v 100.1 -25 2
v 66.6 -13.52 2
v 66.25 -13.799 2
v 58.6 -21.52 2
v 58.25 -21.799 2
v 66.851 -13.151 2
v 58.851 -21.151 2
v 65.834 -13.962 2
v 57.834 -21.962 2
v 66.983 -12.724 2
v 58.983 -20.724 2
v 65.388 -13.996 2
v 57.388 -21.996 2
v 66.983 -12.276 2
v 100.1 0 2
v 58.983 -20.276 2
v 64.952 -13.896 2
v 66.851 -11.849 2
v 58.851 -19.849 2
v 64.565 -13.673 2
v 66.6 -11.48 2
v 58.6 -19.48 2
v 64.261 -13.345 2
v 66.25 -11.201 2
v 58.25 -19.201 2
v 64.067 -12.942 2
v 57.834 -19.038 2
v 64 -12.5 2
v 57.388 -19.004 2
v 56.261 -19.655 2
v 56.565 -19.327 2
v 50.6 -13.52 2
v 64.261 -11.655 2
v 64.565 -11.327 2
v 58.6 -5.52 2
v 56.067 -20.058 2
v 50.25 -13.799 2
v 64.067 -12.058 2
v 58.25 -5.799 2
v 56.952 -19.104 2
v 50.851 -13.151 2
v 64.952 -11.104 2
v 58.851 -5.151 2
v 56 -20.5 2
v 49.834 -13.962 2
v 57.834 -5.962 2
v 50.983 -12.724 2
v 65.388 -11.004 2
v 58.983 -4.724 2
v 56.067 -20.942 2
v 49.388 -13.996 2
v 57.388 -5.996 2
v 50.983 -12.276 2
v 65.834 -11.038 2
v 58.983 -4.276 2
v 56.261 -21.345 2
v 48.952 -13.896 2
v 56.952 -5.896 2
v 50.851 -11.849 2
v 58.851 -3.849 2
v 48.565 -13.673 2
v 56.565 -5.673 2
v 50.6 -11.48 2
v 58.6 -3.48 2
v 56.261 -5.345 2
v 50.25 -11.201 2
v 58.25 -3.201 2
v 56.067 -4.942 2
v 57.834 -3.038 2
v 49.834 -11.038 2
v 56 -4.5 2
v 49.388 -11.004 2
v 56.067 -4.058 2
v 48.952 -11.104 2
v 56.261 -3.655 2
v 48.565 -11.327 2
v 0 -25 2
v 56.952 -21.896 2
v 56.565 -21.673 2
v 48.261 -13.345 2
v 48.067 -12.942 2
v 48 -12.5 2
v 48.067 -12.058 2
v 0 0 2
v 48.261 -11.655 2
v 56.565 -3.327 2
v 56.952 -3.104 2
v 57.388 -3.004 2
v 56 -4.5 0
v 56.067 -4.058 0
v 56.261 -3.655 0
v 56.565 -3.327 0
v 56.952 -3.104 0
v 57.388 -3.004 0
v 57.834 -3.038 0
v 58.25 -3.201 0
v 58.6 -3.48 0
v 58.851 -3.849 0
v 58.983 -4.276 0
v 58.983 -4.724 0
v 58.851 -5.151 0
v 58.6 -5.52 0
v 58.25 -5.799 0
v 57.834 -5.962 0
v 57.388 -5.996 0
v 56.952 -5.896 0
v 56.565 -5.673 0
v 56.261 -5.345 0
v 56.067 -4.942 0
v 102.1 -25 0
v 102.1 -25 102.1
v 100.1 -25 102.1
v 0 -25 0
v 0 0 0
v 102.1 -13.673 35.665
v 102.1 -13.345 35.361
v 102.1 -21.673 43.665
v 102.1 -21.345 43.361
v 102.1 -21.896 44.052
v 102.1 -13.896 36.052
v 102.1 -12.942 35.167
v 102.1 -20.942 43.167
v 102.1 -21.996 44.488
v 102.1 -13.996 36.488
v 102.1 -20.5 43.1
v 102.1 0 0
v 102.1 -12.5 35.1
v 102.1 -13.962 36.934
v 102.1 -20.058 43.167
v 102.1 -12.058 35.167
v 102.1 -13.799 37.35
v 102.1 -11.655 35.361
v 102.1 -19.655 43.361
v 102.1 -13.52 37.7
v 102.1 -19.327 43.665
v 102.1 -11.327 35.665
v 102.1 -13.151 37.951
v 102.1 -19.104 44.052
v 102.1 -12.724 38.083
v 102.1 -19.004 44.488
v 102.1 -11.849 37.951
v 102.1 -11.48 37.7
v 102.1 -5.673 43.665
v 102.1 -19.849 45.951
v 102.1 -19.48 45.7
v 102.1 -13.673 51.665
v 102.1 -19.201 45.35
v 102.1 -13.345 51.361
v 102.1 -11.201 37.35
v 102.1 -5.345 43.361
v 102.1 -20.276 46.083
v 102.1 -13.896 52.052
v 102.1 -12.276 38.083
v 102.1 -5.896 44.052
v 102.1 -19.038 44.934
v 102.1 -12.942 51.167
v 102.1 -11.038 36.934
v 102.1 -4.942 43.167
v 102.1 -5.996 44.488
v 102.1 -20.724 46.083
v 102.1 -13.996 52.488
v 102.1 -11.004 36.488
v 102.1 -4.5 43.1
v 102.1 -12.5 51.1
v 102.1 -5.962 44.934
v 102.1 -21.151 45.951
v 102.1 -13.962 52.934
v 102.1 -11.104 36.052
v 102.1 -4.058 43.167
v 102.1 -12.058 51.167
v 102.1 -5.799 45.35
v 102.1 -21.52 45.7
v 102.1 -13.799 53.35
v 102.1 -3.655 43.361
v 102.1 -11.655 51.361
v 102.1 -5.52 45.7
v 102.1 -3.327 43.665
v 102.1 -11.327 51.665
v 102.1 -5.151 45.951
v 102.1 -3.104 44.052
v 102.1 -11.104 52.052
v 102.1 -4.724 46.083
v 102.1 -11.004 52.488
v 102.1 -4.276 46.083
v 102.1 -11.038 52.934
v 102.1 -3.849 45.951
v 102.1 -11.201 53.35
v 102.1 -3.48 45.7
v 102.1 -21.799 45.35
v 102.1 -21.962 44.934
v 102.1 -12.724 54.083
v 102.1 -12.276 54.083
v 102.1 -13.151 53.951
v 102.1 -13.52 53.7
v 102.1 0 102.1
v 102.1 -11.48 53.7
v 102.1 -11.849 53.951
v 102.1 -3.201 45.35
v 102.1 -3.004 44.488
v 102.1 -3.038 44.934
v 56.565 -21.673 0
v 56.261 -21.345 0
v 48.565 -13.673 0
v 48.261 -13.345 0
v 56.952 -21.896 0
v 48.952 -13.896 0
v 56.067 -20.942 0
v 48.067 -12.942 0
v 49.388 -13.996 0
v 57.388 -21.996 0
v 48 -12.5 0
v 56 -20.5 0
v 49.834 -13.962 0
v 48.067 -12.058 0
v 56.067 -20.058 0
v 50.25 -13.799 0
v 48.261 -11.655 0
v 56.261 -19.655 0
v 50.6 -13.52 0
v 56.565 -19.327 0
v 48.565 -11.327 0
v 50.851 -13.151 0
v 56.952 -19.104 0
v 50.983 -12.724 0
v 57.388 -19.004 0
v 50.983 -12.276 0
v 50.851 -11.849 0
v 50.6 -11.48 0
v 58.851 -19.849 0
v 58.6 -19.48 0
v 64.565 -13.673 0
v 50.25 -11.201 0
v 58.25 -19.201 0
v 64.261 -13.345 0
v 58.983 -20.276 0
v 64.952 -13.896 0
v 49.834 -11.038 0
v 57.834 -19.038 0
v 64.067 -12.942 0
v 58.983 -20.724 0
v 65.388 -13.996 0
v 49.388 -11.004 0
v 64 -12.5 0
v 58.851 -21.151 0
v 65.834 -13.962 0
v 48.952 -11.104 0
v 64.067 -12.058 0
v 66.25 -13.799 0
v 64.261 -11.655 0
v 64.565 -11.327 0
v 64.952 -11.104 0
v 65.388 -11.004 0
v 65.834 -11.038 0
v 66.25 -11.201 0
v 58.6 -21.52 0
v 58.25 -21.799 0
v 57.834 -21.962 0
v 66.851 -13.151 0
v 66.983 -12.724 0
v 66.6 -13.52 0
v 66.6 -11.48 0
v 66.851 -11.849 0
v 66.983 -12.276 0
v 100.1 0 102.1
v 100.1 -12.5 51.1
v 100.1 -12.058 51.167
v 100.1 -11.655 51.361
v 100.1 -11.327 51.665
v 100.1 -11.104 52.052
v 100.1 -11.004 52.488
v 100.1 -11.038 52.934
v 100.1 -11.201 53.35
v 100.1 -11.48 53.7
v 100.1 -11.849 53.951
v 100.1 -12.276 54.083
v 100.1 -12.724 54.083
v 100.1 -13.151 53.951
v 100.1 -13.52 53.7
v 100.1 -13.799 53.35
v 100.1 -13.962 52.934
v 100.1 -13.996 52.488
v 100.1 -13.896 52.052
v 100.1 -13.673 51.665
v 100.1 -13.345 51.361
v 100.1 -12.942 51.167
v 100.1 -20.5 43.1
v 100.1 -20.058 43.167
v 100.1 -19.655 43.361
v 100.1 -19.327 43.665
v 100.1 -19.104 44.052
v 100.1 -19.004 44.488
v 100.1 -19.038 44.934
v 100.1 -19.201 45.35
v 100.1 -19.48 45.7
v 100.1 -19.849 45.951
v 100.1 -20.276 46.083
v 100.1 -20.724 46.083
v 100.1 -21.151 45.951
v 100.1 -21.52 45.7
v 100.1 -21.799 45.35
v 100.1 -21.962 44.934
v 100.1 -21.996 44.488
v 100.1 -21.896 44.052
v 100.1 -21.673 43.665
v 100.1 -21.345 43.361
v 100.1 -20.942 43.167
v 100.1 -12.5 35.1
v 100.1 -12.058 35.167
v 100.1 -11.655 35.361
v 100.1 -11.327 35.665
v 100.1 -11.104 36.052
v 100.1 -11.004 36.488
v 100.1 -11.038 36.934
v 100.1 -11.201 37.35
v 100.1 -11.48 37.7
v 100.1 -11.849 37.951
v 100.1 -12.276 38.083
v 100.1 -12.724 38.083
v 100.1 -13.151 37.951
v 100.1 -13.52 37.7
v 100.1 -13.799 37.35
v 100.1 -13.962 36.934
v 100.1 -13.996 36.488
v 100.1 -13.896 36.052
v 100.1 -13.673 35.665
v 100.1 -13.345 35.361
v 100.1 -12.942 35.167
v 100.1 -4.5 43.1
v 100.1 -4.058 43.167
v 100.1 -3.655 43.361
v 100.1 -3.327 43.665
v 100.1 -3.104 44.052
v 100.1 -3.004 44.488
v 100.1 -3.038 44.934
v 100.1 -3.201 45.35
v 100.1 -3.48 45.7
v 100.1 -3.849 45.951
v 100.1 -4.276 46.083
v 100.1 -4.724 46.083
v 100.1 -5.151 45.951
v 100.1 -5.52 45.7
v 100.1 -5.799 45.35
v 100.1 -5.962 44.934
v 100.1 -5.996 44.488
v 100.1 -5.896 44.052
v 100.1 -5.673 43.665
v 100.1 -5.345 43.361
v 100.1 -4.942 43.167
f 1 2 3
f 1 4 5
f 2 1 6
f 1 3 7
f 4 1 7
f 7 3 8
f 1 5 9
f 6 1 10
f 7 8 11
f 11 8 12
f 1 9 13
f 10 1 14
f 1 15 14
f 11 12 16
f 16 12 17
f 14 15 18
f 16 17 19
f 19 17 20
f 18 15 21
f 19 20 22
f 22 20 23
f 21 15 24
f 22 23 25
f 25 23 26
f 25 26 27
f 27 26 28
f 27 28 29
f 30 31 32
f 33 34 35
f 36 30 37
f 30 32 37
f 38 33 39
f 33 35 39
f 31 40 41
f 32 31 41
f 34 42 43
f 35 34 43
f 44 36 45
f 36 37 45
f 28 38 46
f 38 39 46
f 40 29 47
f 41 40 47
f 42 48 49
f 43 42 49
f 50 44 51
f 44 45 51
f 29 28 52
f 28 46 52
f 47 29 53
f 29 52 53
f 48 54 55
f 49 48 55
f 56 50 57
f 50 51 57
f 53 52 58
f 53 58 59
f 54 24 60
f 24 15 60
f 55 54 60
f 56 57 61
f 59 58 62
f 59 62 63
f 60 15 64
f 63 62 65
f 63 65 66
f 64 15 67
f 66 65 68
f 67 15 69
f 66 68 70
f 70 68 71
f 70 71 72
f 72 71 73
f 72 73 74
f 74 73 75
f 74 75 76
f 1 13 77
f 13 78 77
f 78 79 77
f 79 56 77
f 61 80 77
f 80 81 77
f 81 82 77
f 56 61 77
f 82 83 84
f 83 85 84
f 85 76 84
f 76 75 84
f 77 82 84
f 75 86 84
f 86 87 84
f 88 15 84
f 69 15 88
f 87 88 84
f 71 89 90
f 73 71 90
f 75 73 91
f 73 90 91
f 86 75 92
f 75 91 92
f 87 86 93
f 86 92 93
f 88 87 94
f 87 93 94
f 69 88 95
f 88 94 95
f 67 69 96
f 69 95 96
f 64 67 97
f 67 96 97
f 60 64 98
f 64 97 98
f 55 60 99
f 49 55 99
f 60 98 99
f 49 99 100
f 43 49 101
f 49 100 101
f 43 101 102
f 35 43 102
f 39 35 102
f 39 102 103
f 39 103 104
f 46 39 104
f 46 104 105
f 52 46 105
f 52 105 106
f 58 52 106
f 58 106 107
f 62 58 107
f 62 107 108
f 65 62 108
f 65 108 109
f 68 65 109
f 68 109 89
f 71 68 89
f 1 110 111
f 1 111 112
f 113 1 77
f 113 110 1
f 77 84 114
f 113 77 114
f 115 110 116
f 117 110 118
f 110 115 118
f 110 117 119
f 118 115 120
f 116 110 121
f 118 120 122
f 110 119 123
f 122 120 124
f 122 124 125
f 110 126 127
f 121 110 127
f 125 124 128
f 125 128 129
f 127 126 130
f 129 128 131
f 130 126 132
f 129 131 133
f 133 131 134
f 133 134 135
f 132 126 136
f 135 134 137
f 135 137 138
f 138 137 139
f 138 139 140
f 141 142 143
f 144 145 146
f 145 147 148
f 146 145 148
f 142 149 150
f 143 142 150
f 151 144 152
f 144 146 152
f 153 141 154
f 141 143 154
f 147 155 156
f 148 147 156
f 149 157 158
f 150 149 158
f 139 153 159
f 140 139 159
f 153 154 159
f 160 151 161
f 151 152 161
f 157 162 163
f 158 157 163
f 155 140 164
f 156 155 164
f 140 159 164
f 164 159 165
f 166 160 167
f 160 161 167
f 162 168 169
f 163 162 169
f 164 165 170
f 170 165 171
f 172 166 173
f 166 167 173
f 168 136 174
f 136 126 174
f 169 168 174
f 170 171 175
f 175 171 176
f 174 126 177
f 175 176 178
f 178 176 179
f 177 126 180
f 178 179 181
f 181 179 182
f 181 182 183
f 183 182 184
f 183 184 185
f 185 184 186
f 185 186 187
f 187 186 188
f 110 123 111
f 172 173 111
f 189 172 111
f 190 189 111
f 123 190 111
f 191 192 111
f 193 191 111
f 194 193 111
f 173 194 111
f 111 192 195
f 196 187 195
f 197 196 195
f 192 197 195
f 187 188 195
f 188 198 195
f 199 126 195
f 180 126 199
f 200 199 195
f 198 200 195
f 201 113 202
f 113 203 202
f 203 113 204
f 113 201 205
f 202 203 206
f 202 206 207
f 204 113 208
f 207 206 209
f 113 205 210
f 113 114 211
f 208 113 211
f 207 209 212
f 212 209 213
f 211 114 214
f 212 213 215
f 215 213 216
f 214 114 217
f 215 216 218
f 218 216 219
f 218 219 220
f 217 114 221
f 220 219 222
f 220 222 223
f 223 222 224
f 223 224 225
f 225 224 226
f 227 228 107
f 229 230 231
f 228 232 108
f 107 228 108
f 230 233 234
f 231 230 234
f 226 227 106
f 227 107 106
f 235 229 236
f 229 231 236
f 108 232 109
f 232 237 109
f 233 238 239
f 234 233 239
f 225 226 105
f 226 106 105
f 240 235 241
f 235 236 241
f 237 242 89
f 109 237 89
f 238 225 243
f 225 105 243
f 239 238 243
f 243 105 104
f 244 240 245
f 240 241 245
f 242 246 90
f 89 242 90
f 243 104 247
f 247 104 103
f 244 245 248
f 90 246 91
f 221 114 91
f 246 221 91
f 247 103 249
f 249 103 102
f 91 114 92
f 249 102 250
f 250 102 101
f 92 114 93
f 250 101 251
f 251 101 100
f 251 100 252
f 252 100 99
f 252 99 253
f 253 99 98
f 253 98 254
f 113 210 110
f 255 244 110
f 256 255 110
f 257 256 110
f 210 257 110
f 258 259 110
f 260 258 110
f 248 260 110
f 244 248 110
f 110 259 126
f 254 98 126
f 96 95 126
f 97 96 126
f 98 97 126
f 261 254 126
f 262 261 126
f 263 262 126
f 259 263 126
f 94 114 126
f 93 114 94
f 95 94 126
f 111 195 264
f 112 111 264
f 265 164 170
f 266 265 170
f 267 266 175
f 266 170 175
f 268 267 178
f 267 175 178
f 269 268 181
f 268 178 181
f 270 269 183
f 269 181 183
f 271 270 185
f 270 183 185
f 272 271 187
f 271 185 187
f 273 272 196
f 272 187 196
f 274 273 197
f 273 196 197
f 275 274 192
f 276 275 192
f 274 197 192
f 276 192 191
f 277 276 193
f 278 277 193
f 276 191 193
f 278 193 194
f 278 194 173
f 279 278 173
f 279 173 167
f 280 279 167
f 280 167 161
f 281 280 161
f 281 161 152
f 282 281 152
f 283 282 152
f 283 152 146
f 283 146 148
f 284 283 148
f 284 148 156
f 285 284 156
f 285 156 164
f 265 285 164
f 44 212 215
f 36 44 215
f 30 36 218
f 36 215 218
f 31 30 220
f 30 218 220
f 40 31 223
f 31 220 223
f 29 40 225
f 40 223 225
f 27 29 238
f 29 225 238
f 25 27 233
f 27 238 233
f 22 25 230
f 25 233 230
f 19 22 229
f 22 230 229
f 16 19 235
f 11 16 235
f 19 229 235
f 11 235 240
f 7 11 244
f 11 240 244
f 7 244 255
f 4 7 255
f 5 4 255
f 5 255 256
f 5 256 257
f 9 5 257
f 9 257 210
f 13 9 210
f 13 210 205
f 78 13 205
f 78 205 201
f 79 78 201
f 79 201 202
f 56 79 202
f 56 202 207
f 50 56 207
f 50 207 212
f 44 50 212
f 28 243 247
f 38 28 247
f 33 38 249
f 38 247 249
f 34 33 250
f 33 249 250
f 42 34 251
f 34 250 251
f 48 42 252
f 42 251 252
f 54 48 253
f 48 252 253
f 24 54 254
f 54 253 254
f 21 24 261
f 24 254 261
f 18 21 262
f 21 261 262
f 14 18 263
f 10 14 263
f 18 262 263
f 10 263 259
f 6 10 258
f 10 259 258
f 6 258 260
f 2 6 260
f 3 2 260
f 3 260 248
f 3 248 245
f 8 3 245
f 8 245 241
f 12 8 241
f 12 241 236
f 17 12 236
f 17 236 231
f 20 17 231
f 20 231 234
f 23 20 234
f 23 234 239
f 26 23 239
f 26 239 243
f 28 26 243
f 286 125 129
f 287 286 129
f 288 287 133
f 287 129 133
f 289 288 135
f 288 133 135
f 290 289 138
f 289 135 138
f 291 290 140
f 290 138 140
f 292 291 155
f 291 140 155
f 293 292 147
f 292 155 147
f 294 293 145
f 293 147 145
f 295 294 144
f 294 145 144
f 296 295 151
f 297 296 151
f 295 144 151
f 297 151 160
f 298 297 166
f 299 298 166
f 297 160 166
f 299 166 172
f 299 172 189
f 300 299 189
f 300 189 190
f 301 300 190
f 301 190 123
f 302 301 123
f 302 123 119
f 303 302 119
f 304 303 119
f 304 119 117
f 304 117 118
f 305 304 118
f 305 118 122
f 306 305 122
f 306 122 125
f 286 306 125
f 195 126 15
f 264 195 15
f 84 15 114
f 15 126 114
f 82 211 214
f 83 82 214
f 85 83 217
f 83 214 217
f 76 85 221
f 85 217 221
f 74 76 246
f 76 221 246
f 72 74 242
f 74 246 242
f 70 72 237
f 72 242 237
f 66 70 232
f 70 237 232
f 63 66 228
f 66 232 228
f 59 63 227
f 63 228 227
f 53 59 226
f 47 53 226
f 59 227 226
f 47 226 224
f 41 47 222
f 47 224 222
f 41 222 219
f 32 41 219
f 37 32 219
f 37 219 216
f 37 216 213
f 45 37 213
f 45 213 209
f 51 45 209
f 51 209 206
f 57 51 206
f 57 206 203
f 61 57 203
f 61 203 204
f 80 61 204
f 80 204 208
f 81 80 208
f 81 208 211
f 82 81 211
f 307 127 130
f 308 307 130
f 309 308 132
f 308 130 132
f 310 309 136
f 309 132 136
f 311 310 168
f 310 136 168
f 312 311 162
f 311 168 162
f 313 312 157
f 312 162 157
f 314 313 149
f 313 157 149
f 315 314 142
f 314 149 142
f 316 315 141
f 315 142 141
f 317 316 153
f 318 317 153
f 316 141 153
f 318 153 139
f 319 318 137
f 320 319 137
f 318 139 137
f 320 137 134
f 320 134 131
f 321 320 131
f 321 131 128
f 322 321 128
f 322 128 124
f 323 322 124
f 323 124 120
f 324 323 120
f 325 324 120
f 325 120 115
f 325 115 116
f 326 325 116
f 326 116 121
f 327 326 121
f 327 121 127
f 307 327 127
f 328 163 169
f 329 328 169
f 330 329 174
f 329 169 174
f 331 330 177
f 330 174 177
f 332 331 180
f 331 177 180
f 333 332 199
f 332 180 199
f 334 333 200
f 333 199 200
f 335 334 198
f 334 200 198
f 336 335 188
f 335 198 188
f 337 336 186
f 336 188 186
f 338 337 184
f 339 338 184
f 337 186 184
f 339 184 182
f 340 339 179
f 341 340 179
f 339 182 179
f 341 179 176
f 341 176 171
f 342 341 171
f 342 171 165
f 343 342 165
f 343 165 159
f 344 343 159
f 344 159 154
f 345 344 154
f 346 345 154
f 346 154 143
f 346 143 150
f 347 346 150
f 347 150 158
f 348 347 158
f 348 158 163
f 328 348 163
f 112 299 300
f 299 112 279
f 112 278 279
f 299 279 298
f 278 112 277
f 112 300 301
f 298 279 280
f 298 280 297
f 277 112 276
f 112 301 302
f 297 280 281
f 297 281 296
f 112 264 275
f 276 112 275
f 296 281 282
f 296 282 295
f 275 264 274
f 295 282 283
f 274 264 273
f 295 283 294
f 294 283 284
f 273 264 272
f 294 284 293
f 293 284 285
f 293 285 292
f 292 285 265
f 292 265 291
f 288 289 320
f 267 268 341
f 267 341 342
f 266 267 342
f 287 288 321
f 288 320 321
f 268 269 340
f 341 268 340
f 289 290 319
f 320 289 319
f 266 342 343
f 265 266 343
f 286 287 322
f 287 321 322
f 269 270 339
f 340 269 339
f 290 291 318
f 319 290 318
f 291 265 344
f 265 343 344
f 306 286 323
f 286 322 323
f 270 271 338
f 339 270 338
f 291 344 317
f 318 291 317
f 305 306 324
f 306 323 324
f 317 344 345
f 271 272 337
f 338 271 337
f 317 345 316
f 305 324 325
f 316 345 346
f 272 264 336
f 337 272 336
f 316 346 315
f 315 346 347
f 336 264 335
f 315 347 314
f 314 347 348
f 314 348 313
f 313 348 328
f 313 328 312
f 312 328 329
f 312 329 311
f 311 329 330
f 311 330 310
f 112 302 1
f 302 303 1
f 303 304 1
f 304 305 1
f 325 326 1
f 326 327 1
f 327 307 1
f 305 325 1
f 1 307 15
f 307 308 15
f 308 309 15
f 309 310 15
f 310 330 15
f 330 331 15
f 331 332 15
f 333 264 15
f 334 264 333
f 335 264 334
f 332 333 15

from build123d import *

# Parameters (mm, degrees)
BOSS_EXTRUDE1_DEPTH = 25
SKETCH2_R           = 1.5
CUT_EXTRUDE1_DEPTH  = 11.313708668
SKETCH3_R           = 1.5
CUT_EXTRUDE2_DEPTH  = 25


with BuildPart() as part:
    # Sketch1 → Boss-Extrude1 (new body)
    with BuildSketch(Plane(origin=(0, 0, 0), x_dir=(1, 0, 0), z_dir=(0, 1, 0))):
        Polygon((0, 0), (102.1, 0), (102.1, -102.1), (100.1, -102.1), (100.1, -2), (0, -2), align=None)
    extrude(amount=-BOSS_EXTRUDE1_DEPTH)

    # Sketch2 → Cut-Extrude1 (cut)
    with BuildSketch(Plane(origin=(0, 0, 0), x_dir=(-1, 0, 0), z_dir=(0, 0, -1))):
        with Locations((-65.500000119, -12.5)):
            Circle(SKETCH2_R)
        with Locations((-57.5, -20.500000119)):
            Circle(SKETCH2_R)
        with Locations((-49.499999881, -12.5)):
            Circle(SKETCH2_R)
        with Locations((-57.5, -4.499999881)):
            Circle(SKETCH2_R)
    extrude(amount=-CUT_EXTRUDE1_DEPTH, mode=Mode.SUBTRACT)

    # Sketch3 → Cut-Extrude2 (cut)
    with BuildSketch(Plane(origin=(102.1, 0, 0), x_dir=(0, 0, -1), z_dir=(1, 0, 0))):
        with Locations((-44.6, -4.499999881)):
            Circle(SKETCH3_R)
        with Locations((-36.599999881, -12.5)):
            Circle(SKETCH3_R)
        with Locations((-52.600000119, -12.5)):
            Circle(SKETCH3_R)
        with Locations((-44.6, -20.500000119)):
            Circle(SKETCH3_R)
    extrude(amount=-CUT_EXTRUDE2_DEPTH, mode=Mode.SUBTRACT)


solid = part.part
